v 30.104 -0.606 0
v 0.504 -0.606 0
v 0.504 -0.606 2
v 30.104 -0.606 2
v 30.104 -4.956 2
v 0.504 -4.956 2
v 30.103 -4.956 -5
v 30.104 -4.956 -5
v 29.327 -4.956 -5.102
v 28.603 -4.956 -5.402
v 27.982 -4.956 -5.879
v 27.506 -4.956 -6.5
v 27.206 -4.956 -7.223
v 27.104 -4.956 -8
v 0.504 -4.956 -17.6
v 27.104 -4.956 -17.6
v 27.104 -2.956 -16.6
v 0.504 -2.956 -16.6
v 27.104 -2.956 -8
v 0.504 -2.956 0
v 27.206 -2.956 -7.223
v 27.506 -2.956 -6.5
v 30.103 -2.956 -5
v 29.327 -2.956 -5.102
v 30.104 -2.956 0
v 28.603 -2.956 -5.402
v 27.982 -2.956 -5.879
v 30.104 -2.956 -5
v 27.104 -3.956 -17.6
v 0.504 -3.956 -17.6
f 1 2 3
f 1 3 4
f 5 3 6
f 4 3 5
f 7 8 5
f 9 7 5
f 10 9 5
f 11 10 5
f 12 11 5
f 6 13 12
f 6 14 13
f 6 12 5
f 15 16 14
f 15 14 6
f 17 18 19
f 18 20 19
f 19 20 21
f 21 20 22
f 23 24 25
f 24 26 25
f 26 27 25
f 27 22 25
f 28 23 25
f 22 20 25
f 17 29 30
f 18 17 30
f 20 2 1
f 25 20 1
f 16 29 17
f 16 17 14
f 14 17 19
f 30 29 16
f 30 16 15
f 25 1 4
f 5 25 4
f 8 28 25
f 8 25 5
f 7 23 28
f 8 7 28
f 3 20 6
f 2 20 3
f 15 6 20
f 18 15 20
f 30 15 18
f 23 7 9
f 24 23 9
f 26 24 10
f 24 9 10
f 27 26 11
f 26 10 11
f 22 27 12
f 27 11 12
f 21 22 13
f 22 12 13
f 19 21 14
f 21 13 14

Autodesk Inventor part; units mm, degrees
ref_plane "YZ Plane" through (0, 0, 0) normal (1, 0, 0) x (0, 1, 0)
ref_plane "XZ Plane" through (0, 0, 0) normal (0, 1, 0) x (-1, 0, 0)
ref_plane "XY Plane" through (0, 0, 0) normal (0, 0, 1) x (1, 0, 0)
sketch "Sketch1" plane through (0, 0, 0) normal (0, 0, 1) x (1, 0, 0)
  line L0 (0.5037, -0.606) -> (30.1037, -0.606)
  line L1 (30.1037, -0.606) -> (30.1037, -4.956)
  line L2 (30.1037, -4.956) -> (0.5037, -4.956)
  line L3 (0.5037, -4.956) -> (0.5037, -0.606)
  point P0 (0, 0)
  dimension "d1" = 4.35
  dimension "d2" = 29.6
extrude "Extrusion1" add sketch "Sketch1" along normal blind 2
sketch "Sketch2" plane through (0, 0, 0) normal (0, 0, -1) x (-1, 0, 0)
  line L0 (-30.1037, -4.956) -> (-0.5037, -4.956)
  line L1 (-0.5037, -4.956) -> (-0.5037, -2.956)
  line L2 (-0.5037, -2.956) -> (-30.1037, -2.956)
  line L3 (-30.1037, -2.956) -> (-30.1037, -4.956)
  line L4 (-0.5037, -4.956) -> (-30.1037, -4.956) projected
  line L5 (-30.1037, -4.956) -> (-30.1037, -0.606) projected
  dimension "d11" = 29.6
  dimension "d12" = 2
extrude "Extrusion2" add sketch "Sketch2" along normal blind 17.6
chamfer "Chamfer2" distance 1 angle 45 1 edges at (15.3037, -2.956, -17.6)
sketch "Sketch3" plane through (0.5037, -2.956, 0) normal (0, 1, 0) x (1, 0, 0)
  line L0 (29.6, 17.6) -> (0, 17.6) projected
  line L1 (29.6, 17.6) -> (26.6, 17.6)
  line L2 (26.6, 17.6) -> (26.6, 5)
  line L3 (26.6, 5) -> (29.6, 5)
  line L4 (29.6, 5) -> (29.6, 17.6)
  point P0 (-0.5037, 0)
  dimension "d16" = 3
  dimension "d17" = 12.6
extrude "Extrusion3" cut sketch "Sketch3" against normal through all
fillet "Fillet1" radius 3 1 edges at (27.1037, -3.956, -5)
properties part number "tray_3DPrint"
